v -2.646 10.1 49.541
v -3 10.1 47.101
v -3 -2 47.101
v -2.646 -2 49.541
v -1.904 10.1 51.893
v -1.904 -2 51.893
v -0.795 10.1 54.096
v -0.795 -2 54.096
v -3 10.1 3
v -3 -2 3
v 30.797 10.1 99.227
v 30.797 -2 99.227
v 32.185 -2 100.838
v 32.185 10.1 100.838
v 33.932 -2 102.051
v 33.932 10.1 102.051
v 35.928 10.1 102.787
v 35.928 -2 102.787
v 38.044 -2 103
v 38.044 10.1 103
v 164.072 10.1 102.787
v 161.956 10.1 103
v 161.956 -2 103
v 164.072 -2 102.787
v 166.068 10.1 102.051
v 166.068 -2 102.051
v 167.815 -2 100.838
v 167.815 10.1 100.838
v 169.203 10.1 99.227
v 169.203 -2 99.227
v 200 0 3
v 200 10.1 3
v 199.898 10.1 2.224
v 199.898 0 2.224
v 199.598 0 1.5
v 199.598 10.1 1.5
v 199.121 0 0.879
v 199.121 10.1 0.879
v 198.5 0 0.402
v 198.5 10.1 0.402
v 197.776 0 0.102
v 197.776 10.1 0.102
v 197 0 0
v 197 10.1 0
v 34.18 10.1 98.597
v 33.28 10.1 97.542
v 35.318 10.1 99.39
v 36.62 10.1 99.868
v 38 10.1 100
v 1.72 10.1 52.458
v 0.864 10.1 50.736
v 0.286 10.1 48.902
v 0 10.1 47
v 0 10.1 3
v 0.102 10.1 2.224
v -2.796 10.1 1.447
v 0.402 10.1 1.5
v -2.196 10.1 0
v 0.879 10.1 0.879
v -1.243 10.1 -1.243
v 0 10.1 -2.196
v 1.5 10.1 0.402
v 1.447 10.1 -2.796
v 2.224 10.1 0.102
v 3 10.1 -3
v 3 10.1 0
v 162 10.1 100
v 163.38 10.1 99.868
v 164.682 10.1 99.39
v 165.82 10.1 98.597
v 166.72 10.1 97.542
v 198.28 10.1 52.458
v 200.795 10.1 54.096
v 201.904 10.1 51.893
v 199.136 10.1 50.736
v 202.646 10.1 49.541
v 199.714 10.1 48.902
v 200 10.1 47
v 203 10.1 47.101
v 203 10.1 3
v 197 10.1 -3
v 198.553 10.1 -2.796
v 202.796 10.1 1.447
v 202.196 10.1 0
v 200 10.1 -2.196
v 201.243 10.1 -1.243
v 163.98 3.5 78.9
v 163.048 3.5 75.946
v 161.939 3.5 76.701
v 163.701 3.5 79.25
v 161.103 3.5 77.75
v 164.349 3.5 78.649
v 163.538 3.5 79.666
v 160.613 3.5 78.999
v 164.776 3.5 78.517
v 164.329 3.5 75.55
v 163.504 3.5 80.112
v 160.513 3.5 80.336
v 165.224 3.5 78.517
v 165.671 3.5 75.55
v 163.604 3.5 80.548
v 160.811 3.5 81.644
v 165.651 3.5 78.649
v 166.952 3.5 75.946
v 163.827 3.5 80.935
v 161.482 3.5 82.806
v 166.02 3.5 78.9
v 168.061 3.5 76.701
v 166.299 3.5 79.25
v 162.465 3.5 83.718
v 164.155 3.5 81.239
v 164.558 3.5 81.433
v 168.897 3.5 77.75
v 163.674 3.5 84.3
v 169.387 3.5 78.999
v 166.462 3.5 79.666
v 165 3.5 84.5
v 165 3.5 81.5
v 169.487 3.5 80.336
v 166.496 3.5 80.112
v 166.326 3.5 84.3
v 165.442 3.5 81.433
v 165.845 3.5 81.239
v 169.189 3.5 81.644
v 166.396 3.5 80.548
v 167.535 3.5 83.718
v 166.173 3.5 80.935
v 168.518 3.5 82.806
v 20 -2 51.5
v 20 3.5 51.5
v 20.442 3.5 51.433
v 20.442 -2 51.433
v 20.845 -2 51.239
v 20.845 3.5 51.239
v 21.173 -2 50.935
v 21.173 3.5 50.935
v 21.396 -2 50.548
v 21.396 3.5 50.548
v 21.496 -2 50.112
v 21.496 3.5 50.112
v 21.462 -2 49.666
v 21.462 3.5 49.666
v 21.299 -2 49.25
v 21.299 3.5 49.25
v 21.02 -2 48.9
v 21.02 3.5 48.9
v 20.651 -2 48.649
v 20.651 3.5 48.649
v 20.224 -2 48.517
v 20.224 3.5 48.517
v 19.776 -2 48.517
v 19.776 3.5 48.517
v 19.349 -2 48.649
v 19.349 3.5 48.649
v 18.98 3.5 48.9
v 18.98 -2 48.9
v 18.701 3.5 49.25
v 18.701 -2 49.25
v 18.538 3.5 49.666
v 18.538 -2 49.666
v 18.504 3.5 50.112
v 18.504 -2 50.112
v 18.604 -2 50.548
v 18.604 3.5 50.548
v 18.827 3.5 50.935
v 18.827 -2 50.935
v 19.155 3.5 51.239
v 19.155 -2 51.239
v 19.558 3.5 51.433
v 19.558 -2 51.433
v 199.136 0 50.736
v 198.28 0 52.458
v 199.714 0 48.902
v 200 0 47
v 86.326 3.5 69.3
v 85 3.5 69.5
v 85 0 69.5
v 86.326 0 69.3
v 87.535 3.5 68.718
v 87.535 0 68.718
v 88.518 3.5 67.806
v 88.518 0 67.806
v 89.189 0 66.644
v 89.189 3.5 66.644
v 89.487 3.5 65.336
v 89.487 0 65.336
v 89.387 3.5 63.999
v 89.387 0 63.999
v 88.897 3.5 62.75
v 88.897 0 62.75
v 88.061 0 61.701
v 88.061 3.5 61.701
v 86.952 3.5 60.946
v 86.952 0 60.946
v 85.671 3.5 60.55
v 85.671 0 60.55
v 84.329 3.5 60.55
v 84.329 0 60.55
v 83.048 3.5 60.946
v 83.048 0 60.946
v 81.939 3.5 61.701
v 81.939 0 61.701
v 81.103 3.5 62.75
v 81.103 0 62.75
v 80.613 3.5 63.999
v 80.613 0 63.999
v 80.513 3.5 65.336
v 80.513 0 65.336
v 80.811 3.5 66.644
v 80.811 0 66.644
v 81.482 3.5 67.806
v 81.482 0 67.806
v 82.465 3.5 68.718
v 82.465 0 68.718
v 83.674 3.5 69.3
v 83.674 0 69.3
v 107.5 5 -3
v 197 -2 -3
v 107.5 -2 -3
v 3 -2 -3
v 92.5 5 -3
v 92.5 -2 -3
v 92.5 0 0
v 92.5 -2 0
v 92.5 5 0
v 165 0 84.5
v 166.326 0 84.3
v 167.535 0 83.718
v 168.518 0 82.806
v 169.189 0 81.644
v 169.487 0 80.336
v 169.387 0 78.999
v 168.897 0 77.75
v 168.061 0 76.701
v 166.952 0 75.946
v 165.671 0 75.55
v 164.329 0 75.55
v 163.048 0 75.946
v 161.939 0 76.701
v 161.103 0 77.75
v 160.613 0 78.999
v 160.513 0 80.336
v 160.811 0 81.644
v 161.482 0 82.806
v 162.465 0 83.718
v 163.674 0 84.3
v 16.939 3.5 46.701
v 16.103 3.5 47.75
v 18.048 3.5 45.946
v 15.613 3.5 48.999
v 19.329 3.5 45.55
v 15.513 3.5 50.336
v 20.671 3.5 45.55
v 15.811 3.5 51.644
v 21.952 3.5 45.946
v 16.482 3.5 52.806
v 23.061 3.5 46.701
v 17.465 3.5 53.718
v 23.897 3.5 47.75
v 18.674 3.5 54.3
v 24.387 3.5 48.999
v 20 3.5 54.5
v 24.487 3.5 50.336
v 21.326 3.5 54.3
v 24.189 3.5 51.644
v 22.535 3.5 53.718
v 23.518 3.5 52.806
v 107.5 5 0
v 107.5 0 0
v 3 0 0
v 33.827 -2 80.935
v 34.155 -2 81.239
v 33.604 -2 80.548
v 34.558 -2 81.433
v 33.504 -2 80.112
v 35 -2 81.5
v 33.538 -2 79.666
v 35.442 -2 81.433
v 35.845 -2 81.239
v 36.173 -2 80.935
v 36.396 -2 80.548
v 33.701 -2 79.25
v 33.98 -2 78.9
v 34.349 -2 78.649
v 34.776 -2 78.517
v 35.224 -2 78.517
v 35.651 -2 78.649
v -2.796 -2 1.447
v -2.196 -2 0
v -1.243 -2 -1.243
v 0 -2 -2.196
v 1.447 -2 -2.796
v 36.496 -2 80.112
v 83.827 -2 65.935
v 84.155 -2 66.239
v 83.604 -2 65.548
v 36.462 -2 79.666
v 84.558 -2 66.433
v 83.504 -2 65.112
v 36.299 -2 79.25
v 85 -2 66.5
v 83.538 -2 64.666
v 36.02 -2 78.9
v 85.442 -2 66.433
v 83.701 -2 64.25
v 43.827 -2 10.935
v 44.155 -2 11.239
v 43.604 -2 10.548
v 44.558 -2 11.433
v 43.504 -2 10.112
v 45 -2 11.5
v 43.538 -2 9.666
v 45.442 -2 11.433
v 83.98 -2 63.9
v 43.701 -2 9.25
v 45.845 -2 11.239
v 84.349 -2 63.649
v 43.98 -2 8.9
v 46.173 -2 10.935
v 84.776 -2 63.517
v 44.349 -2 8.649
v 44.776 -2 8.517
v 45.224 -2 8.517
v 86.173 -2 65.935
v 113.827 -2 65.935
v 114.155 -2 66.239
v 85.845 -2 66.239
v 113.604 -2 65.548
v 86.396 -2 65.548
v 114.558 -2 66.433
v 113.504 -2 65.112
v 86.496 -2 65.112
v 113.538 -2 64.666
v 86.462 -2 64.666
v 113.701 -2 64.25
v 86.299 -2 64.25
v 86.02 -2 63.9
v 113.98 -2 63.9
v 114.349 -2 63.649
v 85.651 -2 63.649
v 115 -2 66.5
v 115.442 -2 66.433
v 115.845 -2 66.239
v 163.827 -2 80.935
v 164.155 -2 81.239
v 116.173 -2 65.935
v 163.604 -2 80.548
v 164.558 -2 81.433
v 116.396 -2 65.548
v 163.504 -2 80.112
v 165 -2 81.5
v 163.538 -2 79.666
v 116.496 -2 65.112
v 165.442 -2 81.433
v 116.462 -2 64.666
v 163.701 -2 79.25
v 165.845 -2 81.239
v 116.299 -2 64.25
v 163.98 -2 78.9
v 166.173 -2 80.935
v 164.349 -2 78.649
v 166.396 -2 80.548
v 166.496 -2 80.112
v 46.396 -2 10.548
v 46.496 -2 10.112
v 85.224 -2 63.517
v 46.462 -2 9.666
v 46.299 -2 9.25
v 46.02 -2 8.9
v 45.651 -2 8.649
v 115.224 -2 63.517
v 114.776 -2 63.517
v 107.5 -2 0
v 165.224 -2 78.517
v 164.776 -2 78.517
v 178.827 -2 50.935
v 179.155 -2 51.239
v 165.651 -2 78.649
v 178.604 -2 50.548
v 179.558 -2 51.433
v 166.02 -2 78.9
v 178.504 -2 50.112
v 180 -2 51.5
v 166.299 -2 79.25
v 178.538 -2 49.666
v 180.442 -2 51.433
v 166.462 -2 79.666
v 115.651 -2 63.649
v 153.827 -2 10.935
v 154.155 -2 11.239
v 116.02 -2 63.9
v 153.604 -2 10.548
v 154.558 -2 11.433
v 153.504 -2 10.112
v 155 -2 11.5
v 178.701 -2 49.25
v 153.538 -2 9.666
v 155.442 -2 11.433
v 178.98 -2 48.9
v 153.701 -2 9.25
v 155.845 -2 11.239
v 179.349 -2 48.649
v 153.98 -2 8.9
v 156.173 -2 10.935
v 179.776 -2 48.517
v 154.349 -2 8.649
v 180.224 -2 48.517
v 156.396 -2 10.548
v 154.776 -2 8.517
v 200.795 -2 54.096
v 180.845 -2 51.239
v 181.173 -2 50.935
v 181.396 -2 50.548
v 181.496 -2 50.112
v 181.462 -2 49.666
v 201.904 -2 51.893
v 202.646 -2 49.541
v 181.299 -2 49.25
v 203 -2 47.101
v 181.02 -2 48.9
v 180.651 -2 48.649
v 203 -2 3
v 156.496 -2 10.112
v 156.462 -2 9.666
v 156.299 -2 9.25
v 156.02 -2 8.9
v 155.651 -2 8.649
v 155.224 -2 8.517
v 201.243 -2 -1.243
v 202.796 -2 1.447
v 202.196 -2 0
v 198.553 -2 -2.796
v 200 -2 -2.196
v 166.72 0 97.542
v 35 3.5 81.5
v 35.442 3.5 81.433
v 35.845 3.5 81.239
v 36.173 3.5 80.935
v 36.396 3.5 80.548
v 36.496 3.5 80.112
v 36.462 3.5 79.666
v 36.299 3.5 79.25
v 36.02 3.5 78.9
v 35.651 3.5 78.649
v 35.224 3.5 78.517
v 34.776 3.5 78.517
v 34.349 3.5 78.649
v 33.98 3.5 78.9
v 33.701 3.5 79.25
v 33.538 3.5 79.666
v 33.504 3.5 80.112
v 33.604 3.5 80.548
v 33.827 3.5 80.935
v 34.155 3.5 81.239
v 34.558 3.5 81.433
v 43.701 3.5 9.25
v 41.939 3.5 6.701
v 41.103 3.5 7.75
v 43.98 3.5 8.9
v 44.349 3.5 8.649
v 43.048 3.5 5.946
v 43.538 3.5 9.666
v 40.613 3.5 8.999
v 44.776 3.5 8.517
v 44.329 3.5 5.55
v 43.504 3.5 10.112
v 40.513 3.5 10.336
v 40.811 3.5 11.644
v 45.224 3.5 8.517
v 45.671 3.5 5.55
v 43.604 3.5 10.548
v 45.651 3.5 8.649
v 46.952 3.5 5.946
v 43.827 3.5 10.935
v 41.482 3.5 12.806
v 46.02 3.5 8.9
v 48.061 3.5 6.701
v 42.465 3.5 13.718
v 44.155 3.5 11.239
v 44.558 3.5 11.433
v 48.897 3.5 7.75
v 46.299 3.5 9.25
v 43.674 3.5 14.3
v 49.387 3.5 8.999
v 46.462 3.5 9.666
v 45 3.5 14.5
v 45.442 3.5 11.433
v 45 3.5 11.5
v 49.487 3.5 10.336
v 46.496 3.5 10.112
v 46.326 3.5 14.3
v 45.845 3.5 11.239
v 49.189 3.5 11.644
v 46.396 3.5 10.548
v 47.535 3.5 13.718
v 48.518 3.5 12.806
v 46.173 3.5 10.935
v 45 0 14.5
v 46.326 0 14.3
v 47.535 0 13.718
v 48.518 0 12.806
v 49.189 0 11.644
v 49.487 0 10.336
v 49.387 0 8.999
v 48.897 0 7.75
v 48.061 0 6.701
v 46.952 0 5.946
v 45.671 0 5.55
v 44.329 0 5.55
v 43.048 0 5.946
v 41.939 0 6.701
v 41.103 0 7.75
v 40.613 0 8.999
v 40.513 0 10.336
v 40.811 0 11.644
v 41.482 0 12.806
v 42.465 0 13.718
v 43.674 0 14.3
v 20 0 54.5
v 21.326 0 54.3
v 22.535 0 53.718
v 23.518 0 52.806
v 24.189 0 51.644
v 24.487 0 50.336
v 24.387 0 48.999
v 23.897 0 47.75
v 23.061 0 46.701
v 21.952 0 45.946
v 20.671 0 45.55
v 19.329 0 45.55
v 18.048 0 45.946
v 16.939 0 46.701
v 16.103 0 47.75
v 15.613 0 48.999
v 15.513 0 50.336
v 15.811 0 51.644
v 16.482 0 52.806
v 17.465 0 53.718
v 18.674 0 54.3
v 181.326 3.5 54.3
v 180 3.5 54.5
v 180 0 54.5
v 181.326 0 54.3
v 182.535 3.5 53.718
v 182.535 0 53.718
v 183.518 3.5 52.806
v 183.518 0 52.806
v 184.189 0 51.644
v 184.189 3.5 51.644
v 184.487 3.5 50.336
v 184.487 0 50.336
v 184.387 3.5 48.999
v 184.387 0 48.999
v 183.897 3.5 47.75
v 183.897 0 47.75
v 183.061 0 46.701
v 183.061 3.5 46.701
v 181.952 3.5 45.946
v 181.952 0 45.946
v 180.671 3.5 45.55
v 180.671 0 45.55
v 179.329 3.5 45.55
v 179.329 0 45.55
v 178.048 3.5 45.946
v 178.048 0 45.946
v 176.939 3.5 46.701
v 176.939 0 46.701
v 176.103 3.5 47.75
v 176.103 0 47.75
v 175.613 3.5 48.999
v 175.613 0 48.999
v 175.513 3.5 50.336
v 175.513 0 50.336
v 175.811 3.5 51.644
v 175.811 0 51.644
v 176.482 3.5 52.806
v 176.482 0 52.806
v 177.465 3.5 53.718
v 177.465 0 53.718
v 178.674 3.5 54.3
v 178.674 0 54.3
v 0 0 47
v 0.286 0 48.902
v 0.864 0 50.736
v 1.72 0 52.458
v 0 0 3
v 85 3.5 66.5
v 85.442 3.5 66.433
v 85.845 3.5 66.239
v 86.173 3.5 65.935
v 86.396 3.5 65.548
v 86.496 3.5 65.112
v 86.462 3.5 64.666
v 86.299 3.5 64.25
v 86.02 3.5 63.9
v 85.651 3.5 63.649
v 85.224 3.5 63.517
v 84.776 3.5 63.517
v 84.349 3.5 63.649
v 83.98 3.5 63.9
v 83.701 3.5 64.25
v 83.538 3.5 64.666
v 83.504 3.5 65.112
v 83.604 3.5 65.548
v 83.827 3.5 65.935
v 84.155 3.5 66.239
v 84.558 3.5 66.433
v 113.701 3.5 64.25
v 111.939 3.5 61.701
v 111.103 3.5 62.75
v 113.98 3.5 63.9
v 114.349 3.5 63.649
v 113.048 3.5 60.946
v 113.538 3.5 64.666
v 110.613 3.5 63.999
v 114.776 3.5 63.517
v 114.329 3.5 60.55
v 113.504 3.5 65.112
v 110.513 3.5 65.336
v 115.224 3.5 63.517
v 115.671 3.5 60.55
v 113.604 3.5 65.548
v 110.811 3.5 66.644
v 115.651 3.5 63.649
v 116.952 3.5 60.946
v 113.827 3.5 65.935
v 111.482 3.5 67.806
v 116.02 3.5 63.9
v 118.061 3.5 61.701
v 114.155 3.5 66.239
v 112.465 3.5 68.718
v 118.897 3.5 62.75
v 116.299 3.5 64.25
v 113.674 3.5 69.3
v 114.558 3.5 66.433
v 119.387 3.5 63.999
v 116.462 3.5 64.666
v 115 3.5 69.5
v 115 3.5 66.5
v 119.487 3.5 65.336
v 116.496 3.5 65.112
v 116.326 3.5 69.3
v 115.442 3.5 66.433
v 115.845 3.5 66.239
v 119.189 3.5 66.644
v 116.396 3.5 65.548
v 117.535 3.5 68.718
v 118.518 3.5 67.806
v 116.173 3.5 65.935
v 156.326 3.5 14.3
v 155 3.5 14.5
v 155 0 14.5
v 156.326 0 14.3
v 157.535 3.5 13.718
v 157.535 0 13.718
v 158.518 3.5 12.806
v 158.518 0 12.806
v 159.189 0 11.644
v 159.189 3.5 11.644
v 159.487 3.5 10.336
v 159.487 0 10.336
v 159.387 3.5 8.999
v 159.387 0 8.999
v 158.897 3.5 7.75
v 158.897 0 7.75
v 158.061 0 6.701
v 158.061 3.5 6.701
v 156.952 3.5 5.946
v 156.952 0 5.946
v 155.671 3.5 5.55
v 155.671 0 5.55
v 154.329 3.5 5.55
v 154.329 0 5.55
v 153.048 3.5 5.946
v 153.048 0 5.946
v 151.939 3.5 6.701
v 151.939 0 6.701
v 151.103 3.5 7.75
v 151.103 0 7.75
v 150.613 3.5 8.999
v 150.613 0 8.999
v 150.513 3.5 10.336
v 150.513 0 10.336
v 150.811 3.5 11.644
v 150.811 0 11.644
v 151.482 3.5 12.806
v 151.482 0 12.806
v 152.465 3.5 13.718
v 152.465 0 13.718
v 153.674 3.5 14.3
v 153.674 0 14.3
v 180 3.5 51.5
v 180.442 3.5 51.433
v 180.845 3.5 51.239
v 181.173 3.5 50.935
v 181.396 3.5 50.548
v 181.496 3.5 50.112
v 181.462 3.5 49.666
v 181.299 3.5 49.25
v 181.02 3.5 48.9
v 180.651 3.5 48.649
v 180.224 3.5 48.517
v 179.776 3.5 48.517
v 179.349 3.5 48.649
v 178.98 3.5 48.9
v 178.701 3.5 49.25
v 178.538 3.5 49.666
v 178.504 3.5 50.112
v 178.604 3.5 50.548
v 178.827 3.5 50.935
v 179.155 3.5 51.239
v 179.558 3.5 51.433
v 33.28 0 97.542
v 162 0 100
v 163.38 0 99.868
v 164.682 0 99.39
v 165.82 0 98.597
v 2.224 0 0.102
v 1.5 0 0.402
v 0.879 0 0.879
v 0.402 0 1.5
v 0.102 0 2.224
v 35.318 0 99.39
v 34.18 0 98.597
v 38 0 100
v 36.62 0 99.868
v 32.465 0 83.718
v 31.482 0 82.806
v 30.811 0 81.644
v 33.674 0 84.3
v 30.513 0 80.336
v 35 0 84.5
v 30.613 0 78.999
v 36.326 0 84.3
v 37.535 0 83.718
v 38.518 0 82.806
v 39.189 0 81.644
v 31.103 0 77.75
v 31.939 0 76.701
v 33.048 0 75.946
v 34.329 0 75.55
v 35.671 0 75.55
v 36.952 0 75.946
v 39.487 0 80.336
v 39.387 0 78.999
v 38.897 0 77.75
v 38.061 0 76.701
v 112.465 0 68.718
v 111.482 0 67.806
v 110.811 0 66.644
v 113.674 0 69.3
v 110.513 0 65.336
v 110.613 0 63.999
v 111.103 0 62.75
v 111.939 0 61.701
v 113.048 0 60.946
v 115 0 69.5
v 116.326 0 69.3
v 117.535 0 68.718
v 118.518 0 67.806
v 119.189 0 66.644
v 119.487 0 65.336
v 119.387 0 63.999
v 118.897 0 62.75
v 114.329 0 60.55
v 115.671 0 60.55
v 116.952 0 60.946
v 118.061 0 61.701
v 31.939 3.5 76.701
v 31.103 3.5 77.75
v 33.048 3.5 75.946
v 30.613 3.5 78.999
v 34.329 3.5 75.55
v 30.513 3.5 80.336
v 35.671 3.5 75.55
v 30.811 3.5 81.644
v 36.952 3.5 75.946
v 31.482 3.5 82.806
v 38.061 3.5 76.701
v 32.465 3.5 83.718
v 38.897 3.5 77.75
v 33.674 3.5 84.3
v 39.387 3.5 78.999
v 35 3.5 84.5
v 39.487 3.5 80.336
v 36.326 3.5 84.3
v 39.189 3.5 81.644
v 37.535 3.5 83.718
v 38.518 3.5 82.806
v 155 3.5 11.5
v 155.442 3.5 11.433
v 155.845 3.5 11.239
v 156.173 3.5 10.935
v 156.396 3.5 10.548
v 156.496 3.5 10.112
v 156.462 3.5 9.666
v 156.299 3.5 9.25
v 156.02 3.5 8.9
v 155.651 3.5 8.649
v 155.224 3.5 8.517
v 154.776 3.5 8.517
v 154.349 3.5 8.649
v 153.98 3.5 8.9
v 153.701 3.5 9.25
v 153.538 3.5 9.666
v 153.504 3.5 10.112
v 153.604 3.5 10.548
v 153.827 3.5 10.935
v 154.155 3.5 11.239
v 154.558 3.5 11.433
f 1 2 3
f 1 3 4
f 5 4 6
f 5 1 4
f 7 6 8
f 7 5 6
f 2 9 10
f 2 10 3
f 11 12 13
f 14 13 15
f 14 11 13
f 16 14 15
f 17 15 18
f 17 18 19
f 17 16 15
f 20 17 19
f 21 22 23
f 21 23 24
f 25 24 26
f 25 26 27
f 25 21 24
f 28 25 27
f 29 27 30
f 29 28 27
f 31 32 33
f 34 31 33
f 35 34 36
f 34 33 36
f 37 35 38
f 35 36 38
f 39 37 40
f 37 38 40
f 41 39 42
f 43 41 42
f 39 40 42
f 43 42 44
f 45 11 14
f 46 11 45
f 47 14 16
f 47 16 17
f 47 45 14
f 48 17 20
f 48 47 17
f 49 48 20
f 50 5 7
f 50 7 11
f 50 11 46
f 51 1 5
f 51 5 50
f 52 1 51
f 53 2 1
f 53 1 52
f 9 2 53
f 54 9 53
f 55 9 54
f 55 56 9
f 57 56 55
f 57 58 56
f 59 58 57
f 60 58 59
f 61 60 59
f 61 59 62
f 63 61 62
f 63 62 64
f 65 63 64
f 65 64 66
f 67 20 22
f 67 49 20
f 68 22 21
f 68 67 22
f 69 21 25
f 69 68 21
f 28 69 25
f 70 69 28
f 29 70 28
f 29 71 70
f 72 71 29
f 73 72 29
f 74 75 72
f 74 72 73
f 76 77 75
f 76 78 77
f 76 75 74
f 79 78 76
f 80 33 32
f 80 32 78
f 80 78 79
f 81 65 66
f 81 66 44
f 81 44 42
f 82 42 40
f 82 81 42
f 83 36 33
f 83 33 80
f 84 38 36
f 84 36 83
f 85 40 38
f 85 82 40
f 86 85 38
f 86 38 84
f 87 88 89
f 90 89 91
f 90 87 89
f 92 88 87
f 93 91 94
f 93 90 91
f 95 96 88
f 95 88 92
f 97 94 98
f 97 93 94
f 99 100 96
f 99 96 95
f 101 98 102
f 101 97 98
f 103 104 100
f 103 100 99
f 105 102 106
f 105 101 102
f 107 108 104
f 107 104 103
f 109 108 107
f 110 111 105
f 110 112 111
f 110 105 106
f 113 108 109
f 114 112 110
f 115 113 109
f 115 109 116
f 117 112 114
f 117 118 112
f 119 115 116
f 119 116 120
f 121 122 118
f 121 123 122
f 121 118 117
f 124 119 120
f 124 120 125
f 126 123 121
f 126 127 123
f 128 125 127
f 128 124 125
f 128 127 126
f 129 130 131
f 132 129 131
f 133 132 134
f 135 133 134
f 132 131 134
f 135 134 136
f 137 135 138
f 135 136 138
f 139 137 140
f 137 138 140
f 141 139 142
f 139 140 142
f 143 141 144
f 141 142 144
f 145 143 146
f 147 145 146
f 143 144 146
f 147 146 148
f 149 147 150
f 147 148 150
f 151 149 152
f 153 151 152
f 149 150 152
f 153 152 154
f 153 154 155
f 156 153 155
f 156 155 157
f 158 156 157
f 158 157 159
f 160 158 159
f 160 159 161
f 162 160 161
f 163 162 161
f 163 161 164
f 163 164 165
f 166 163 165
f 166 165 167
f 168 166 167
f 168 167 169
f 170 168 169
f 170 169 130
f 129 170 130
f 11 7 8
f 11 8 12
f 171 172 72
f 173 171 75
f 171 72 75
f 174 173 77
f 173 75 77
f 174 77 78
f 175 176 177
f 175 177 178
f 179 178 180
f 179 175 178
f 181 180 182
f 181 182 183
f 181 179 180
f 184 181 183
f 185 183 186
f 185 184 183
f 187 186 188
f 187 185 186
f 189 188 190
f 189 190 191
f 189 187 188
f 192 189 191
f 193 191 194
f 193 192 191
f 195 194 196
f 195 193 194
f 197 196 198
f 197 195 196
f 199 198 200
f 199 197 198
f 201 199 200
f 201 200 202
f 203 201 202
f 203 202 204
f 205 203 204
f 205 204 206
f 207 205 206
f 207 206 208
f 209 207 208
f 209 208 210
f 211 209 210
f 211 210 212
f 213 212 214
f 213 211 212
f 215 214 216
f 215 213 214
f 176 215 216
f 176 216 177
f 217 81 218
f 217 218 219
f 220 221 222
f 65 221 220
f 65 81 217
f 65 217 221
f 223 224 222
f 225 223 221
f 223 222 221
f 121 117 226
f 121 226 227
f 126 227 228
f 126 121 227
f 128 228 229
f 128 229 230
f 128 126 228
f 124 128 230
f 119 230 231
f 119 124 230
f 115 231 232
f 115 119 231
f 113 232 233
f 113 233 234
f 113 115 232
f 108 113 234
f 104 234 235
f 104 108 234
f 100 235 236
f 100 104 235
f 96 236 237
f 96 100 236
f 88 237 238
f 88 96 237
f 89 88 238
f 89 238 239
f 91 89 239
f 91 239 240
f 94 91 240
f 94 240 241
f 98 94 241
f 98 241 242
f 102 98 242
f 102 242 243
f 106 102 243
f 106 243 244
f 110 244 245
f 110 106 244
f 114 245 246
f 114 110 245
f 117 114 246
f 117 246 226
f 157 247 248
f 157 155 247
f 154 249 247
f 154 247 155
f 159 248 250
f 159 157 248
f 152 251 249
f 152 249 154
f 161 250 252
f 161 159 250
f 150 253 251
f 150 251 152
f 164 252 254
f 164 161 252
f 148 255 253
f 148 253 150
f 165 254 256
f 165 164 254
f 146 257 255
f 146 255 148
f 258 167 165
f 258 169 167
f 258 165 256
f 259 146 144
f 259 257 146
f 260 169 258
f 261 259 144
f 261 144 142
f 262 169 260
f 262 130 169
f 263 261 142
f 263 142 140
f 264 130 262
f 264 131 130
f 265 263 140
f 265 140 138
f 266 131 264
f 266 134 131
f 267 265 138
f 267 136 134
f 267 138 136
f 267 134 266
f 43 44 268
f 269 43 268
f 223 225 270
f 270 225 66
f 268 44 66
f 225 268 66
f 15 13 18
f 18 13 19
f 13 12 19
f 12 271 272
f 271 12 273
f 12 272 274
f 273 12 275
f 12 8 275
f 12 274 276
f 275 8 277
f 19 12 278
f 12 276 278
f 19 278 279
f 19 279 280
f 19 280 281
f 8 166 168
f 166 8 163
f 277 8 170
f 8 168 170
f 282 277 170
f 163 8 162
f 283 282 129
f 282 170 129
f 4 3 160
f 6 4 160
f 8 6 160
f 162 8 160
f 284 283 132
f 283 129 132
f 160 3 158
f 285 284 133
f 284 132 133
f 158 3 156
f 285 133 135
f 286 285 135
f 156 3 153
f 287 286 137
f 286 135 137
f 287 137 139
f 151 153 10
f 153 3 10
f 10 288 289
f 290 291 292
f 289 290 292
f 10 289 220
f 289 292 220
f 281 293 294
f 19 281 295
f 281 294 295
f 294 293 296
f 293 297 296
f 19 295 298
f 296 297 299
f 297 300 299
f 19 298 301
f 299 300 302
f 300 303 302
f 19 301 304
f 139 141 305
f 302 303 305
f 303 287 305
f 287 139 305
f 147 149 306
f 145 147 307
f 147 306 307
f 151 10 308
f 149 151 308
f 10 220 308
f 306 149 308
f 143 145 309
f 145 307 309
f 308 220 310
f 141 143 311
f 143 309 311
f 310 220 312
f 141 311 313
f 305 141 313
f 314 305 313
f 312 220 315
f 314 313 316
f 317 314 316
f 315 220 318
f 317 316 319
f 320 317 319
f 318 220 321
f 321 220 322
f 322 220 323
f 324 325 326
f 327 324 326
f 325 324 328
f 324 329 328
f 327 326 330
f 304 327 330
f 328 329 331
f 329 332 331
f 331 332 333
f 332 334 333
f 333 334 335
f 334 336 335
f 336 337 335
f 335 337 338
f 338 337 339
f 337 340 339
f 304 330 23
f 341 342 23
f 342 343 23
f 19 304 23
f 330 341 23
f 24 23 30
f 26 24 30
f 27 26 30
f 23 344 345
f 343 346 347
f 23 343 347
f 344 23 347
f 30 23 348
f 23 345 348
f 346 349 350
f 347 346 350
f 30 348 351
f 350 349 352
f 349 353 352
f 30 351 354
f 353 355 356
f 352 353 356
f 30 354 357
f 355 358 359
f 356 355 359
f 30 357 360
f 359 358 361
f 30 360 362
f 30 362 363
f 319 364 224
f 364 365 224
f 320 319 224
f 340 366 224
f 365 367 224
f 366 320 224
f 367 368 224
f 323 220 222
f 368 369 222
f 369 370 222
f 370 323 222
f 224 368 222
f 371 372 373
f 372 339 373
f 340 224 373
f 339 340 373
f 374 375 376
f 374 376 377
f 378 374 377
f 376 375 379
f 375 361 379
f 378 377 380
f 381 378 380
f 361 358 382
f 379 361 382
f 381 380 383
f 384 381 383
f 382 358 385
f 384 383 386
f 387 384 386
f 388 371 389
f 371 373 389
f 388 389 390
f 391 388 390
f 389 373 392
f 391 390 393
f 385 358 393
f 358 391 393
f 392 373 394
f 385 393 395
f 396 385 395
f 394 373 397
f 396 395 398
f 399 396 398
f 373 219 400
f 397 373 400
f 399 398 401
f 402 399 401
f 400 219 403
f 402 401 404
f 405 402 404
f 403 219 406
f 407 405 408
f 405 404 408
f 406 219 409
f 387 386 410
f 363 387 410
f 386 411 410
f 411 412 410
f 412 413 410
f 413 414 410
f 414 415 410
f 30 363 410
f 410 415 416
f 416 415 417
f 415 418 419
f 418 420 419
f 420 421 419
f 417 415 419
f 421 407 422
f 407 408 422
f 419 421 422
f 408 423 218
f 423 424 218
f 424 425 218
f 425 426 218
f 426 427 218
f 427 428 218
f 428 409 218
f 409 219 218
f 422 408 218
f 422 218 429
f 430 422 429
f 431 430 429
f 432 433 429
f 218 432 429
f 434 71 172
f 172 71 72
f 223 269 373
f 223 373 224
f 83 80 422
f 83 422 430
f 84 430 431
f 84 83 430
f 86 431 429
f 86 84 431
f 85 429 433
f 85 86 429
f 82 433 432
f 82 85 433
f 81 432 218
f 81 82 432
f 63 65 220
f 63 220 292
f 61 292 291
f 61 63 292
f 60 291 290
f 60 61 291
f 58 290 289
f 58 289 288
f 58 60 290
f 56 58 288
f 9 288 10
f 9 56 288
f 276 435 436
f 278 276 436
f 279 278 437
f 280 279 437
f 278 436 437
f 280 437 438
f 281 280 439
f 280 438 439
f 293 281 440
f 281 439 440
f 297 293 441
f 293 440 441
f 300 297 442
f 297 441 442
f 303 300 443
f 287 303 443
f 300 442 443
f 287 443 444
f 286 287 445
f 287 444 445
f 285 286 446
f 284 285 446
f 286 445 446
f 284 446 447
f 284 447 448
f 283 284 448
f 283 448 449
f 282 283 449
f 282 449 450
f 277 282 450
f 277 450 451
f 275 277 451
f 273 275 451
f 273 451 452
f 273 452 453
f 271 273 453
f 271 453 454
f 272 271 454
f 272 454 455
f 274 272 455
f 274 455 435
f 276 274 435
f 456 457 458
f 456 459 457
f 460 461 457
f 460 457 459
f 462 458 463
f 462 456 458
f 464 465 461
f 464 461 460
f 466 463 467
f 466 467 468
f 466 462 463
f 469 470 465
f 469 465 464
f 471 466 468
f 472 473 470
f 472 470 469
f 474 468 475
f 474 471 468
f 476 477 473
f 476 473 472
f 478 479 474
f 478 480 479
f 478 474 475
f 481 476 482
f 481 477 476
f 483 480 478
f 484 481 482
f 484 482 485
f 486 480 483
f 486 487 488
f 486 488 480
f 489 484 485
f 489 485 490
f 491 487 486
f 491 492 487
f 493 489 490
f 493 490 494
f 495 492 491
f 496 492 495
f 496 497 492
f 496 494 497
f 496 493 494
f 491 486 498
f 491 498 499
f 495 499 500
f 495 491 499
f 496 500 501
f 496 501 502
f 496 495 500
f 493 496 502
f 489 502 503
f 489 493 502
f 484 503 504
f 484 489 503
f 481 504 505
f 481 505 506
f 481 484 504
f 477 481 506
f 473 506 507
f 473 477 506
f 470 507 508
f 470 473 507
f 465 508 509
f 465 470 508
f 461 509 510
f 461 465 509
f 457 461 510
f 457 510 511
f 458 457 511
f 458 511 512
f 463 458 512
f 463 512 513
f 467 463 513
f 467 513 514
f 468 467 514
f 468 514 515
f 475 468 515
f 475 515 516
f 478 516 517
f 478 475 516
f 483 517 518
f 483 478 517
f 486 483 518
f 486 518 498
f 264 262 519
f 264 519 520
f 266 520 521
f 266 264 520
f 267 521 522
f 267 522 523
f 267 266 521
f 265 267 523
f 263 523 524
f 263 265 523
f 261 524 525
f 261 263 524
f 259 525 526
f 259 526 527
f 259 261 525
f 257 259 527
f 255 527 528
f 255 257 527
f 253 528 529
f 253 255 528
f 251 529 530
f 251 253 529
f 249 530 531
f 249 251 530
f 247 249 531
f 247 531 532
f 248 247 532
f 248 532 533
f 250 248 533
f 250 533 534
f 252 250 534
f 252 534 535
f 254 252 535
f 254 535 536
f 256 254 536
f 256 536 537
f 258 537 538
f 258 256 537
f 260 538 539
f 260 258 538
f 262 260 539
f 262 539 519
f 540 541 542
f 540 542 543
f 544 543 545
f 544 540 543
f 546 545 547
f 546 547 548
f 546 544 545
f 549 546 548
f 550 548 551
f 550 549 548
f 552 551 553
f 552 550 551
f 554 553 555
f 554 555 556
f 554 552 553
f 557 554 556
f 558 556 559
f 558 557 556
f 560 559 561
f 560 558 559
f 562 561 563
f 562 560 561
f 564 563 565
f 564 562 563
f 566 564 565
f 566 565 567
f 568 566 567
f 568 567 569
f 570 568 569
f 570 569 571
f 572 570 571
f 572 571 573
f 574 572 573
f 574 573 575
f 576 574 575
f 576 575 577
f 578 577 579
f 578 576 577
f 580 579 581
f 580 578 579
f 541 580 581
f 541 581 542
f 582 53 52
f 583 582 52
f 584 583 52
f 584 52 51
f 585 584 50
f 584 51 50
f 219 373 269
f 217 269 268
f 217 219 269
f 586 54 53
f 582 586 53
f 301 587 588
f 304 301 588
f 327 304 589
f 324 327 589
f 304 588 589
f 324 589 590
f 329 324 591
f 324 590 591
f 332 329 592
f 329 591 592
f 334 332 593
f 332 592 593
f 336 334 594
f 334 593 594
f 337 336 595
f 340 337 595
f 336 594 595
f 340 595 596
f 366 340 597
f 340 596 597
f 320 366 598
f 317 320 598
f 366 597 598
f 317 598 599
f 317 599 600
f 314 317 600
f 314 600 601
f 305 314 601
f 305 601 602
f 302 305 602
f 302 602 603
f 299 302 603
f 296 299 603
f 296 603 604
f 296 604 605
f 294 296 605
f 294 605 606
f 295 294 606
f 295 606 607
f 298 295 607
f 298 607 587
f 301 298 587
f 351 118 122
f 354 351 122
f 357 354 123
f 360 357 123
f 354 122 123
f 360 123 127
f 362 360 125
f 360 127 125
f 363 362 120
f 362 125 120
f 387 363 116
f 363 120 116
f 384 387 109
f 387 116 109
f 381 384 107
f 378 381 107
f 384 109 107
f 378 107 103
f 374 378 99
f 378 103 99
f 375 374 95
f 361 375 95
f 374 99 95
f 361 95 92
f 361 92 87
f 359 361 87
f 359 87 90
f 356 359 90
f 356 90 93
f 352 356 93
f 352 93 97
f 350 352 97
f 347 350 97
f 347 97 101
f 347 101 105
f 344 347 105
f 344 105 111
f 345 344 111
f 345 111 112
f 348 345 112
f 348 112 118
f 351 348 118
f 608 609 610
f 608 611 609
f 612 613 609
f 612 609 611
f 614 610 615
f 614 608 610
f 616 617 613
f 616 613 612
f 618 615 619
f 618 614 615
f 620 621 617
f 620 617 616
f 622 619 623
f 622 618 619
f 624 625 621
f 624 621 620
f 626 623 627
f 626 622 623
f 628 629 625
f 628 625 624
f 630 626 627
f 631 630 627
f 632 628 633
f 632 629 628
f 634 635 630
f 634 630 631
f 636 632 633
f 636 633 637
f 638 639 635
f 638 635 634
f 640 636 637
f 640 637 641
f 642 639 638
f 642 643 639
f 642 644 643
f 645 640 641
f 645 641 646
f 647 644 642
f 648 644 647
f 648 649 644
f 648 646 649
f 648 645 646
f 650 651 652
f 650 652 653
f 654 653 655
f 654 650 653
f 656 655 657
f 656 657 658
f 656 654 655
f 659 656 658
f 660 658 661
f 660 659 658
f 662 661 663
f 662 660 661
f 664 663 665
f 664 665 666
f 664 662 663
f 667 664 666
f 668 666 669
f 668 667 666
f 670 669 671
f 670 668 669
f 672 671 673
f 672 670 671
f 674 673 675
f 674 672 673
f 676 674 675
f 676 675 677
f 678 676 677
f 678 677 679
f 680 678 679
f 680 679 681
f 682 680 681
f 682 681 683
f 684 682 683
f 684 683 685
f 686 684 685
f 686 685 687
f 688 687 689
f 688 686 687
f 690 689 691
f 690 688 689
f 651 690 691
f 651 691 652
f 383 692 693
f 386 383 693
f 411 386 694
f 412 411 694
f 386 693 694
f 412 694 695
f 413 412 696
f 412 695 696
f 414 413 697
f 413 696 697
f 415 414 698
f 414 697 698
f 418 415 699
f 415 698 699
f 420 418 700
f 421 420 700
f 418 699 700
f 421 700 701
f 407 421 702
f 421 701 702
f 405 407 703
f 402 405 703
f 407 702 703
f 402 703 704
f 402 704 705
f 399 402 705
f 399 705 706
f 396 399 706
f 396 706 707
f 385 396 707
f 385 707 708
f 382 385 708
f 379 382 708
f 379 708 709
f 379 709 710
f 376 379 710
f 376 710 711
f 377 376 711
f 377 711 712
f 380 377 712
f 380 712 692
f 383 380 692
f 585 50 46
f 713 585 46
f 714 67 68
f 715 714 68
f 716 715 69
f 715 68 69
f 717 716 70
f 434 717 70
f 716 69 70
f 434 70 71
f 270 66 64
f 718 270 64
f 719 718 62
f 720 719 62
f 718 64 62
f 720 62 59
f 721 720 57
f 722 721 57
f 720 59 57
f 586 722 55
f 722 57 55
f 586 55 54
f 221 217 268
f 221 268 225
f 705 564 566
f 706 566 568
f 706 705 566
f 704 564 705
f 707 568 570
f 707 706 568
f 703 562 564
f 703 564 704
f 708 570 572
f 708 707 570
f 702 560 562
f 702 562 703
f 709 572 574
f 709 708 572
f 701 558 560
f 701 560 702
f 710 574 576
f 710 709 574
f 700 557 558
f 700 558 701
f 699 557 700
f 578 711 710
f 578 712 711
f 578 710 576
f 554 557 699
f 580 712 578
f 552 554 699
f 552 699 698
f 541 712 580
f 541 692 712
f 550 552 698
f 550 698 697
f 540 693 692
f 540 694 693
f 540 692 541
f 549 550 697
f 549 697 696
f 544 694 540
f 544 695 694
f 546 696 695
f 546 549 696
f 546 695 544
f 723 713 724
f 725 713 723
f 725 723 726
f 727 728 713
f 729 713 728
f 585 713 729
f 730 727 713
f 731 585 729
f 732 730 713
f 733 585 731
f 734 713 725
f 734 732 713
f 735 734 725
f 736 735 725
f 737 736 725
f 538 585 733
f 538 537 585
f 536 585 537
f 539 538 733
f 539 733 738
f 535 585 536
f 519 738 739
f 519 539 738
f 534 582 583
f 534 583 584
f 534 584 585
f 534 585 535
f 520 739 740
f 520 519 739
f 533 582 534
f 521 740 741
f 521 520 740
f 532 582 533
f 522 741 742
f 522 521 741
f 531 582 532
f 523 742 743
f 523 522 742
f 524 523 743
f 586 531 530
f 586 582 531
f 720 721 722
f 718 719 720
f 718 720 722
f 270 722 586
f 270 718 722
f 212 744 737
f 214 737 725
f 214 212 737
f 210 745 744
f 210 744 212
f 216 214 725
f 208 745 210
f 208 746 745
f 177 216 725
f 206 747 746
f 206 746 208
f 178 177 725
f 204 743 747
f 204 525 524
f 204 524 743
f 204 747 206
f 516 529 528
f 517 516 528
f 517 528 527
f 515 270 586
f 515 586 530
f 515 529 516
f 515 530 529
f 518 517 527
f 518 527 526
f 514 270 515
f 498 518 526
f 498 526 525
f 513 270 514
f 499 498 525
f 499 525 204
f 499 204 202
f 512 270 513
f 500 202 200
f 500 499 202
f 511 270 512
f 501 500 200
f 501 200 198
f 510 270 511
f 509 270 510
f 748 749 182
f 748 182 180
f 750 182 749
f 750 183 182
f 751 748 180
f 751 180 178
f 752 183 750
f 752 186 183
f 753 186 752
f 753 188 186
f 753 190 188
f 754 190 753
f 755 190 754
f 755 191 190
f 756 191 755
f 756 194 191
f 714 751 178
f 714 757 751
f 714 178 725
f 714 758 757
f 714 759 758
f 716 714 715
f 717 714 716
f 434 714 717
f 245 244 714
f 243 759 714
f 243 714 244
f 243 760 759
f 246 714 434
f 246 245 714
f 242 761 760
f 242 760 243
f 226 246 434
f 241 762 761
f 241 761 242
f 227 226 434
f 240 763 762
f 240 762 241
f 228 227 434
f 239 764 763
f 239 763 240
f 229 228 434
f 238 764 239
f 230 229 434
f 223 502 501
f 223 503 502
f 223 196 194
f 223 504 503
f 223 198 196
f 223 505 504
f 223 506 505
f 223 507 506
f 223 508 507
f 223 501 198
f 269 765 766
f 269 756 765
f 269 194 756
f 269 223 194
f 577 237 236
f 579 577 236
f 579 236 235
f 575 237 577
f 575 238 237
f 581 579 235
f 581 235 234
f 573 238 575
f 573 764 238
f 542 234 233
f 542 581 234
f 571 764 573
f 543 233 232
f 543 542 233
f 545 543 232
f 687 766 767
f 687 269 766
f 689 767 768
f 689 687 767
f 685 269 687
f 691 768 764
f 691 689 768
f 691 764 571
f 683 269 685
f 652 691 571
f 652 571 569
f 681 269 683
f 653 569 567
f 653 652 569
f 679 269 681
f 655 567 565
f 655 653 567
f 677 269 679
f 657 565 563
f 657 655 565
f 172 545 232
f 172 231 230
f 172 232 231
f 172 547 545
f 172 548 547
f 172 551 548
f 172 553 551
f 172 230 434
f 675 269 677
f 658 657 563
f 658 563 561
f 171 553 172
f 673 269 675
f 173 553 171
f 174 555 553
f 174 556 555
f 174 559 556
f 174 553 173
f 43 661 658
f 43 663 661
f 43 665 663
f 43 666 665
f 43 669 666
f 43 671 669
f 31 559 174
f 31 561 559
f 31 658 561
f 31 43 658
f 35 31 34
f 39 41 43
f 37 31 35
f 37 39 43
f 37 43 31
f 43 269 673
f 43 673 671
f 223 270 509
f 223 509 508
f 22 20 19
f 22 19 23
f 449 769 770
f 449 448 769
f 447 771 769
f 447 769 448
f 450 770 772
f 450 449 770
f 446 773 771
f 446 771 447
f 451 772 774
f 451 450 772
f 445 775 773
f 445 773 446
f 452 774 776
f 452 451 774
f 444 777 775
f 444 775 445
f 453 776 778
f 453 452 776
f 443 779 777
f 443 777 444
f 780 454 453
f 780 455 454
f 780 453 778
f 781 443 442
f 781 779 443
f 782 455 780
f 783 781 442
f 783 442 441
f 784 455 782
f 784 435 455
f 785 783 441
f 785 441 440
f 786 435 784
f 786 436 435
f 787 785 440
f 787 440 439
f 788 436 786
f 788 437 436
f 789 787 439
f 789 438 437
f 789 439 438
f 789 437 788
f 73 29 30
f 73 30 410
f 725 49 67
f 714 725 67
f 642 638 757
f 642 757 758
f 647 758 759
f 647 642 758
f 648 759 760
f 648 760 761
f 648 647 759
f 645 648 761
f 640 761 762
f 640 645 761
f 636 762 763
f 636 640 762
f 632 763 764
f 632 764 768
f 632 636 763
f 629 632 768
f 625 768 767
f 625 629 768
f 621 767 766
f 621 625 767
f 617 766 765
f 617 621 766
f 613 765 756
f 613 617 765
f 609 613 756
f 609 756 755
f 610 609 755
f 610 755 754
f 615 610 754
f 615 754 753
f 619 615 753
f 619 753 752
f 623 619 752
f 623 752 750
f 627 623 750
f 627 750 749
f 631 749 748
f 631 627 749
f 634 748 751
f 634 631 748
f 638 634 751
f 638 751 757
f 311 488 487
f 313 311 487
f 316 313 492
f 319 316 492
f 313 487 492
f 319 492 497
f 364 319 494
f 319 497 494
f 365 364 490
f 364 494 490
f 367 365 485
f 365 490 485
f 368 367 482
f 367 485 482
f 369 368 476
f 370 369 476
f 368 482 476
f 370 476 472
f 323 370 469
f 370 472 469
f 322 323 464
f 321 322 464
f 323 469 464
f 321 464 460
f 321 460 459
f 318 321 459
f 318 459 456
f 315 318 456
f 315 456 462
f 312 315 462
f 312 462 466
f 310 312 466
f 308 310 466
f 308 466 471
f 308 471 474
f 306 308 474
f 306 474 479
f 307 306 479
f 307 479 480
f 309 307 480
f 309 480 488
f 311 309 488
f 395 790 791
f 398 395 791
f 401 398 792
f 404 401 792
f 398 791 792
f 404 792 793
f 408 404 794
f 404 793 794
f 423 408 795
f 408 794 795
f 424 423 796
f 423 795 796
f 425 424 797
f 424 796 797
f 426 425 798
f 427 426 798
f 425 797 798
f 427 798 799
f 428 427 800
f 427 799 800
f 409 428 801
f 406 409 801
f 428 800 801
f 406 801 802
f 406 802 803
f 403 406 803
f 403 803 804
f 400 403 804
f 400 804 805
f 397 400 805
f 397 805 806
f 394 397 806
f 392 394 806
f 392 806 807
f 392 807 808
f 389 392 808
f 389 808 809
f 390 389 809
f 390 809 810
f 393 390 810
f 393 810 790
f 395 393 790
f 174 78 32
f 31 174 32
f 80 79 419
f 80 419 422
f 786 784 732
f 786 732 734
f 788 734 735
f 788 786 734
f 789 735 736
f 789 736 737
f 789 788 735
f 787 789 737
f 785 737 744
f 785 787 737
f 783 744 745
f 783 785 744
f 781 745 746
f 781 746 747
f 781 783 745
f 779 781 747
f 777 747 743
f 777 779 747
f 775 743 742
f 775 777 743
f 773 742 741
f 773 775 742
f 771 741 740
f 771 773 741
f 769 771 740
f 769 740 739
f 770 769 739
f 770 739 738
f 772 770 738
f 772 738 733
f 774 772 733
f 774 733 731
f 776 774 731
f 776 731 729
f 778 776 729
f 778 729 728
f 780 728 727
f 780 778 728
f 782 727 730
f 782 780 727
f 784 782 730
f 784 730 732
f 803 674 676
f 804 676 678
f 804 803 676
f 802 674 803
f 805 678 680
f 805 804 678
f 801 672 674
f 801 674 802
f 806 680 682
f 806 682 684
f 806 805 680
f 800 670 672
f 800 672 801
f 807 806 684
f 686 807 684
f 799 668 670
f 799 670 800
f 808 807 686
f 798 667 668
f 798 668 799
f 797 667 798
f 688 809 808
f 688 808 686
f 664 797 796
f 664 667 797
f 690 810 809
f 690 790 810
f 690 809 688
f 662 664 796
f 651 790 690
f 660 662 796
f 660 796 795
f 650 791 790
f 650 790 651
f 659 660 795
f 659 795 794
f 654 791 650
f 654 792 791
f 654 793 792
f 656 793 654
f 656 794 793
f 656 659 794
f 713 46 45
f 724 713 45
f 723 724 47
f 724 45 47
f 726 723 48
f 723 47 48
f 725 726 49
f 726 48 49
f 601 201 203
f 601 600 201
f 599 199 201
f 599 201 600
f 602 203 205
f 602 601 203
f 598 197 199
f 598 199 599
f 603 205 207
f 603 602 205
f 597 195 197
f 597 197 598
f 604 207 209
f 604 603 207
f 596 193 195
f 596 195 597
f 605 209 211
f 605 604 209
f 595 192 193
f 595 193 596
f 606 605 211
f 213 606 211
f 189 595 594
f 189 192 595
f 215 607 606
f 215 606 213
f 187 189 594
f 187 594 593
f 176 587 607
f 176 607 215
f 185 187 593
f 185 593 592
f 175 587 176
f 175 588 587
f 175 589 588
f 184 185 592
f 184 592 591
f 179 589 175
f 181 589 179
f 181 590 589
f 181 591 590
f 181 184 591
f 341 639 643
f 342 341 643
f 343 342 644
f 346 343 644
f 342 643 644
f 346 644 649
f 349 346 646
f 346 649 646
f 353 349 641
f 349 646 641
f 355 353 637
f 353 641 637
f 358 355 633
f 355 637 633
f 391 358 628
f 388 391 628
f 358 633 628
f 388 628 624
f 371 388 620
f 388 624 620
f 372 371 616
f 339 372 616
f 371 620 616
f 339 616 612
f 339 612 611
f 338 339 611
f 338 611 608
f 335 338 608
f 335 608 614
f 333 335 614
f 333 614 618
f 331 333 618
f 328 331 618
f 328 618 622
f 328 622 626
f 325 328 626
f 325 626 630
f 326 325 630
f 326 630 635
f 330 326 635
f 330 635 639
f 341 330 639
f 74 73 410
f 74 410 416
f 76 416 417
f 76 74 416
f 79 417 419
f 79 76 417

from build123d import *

# Parameters (mm, degrees)
EXTRUDE_1_DEPTH     = 2
EXTRUDE_START       = 10.1
EXTRUDE_2_DEPTH     = 10.1
SKETCH_3_R          = 1.5
CUT_EXTRUDE_1_DEPTH = 228.860936532
EXTRUDE_START_2     = 3.5
SKETCH_6_R          = 4.5
SKETCH_6_R_2        = 1.5
EXTRUDE_3_DEPTH     = 3.5
SKETCH_7_W          = 15
SKETCH_7_H          = 7
CUT_EXTRUDE_2_DEPTH = 3


with BuildPart() as part:
    # 草图1 → 凸台-拉伸1 (new body)
    with BuildSketch(Plane(origin=(0, 0, 0), x_dir=(1, 0, 0), z_dir=(0, 1, 0))):
        with BuildLine():
            Line((197, 3), (3, 3))
            ThreePointArc((3, 3), (-1.242640687, 1.242640687), (-3, -3))
            Line((-3, -3), (-3, -47.100513143))
            ThreePointArc((-3, -47.100513143), (-2.32247943, -50.732097147), (-0.794949231, -54.09573922))
            Line((-0.794949231, -54.09573922), (30.796891429, -99.226940163))
            ThreePointArc((30.796891429, -99.226940163), (33.932268231, -102.05074496), (38.04363979, -103))
            Line((38.04363979, -103), (161.95636021, -103))
            ThreePointArc((161.95636021, -103), (166.067731769, -102.05074496), (169.203108571, -99.226940163))
            Line((169.203108571, -99.226940163), (200.794949231, -54.09573922))
            ThreePointArc((200.794949231, -54.09573922), (202.32247943, -50.732097147), (203, -47.100513143))
            Line((203, -47.100513143), (203, -3))
            ThreePointArc((203, -3), (201.242640687, 1.242640687), (197, 3))
        make_face()
    extrude(amount=-EXTRUDE_1_DEPTH)

    # 草图1<3> → 凸台-拉伸2 (add)
    with BuildSketch(Plane(origin=(0, 0, 0), x_dir=(1, 0, 0), z_dir=(0, 1, 0)).offset(EXTRUDE_START)):
        with BuildLine():
            Line((197, 3), (3, 3))
            ThreePointArc((3, 3), (-1.242640687, 1.242640687), (-3, -3))
            Line((-3, -3), (-3, -47.100513143))
            ThreePointArc((-3, -47.100513143), (-2.32247943, -50.732097147), (-0.794949231, -54.09573922))
            Line((-0.794949231, -54.09573922), (30.796891429, -99.226940163))
            ThreePointArc((30.796891429, -99.226940163), (33.932268231, -102.05074496), (38.04363979, -103))
            Line((38.04363979, -103), (161.95636021, -103))
            ThreePointArc((161.95636021, -103), (166.067731769, -102.05074496), (169.203108571, -99.226940163))
            Line((169.203108571, -99.226940163), (200.794949231, -54.09573922))
            ThreePointArc((200.794949231, -54.09573922), (202.32247943, -50.732097147), (203, -47.100513143))
            Line((203, -47.100513143), (203, -3))
            ThreePointArc((203, -3), (201.242640687, 1.242640687), (197, 3))
        make_face()
        with BuildLine():
            Line((0, -3), (0, -47))
            ThreePointArc((0, -47), (0.538734236, -49.830178992), (1.720387033, -52.457695762))
            Line((1.720387033, -52.457695762), (33.279612967, -97.542304238))
            ThreePointArc((33.279612967, -97.542304238), (35.317699373, -99.389808931), (38, -100))
            Line((38, -100), (162, -100))
            ThreePointArc((162, -100), (164.682300627, -99.389808931), (166.720387033, -97.542304238))
            Line((166.720387033, -97.542304238), (198.279612967, -52.457695762))
            ThreePointArc((198.279612967, -52.457695762), (199.461265764, -49.830178992), (200, -47))
            Line((200, -47), (200, -3))
            ThreePointArc((200, -3), (199.121320344, -0.878679656), (197, 0))
            Line((197, 0), (3, 0))
            ThreePointArc((3, 0), (0.878679656, -0.878679656), (0, -3))
        make_face(mode=Mode.SUBTRACT)
    extrude(amount=-EXTRUDE_2_DEPTH)

    # 草图3 → 切除-拉伸1 (cut, through all)
    with BuildSketch(Plane(origin=(0, 0, 0), x_dir=(1, 0, 0), z_dir=(0, 1, 0))):
        with Locations((45, -10)):
            Circle(SKETCH_3_R)
        with Locations((20, -50)):
            Circle(SKETCH_3_R)
        with Locations((35, -80)):
            Circle(SKETCH_3_R)
        with Locations((85, -65)):
            Circle(SKETCH_3_R)
        with Locations((155, -10)):
            Circle(SKETCH_3_R)
        with Locations((180, -50)):
            Circle(SKETCH_3_R)
        with Locations((165, -80)):
            Circle(SKETCH_3_R)
        with Locations((115, -65)):
            Circle(SKETCH_3_R)
    extrude(amount=-CUT_EXTRUDE_1_DEPTH, mode=Mode.SUBTRACT)

    # 草图6 → 凸台-拉伸3 (add)
    # profile 1 of 8: a face of its own
    with BuildSketch(Plane(origin=(0, 0, 0), x_dir=(1, 0, 0), z_dir=(0, 1, 0)).offset(EXTRUDE_START_2)):
        with Locations((85, -65)):
            Circle(SKETCH_6_R)
        with Locations((85, -65)):
            Circle(SKETCH_6_R_2, mode=Mode.SUBTRACT)
    # profile 2 of 8: a face of its own
    with BuildSketch(Plane(origin=(0, 0, 0), x_dir=(1, 0, 0), z_dir=(0, 1, 0)).offset(EXTRUDE_START_2)):
        with Locations((35, -80)):
            Circle(SKETCH_6_R)
        with Locations((35, -80)):
            Circle(SKETCH_6_R_2, mode=Mode.SUBTRACT)
    # profile 3 of 8: a face of its own
    with BuildSketch(Plane(origin=(0, 0, 0), x_dir=(1, 0, 0), z_dir=(0, 1, 0)).offset(EXTRUDE_START_2)):
        with Locations((20, -50)):
            Circle(SKETCH_6_R)
        with Locations((20, -50)):
            Circle(SKETCH_6_R_2, mode=Mode.SUBTRACT)
    # profile 4 of 8: a face of its own
    with BuildSketch(Plane(origin=(0, 0, 0), x_dir=(1, 0, 0), z_dir=(0, 1, 0)).offset(EXTRUDE_START_2)):
        with Locations((45, -10)):
            Circle(SKETCH_6_R)
        with Locations((45, -10)):
            Circle(SKETCH_6_R_2, mode=Mode.SUBTRACT)
    # profile 5 of 8: a face of its own
    with BuildSketch(Plane(origin=(0, 0, 0), x_dir=(1, 0, 0), z_dir=(0, 1, 0)).offset(EXTRUDE_START_2)):
        with Locations((155, -10)):
            Circle(SKETCH_6_R)
        with Locations((155, -10)):
            Circle(SKETCH_6_R_2, mode=Mode.SUBTRACT)
    # profile 6 of 8: a face of its own
    with BuildSketch(Plane(origin=(0, 0, 0), x_dir=(1, 0, 0), z_dir=(0, 1, 0)).offset(EXTRUDE_START_2)):
        with Locations((115, -65)):
            Circle(SKETCH_6_R)
        with Locations((115, -65)):
            Circle(SKETCH_6_R_2, mode=Mode.SUBTRACT)
    # profile 7 of 8: a face of its own
    with BuildSketch(Plane(origin=(0, 0, 0), x_dir=(1, 0, 0), z_dir=(0, 1, 0)).offset(EXTRUDE_START_2)):
        with Locations((180, -50)):
            Circle(SKETCH_6_R)
        with Locations((180, -50)):
            Circle(SKETCH_6_R_2, mode=Mode.SUBTRACT)
    # profile 8 of 8: a face of its own
    with BuildSketch(Plane(origin=(0, 0, 0), x_dir=(1, 0, 0), z_dir=(0, 1, 0)).offset(EXTRUDE_START_2)):
        with Locations((165, -80)):
            Circle(SKETCH_6_R)
        with Locations((165, -80)):
            Circle(SKETCH_6_R_2, mode=Mode.SUBTRACT)
    extrude(amount=-EXTRUDE_3_DEPTH)

    # 草图7 → 切除-拉伸2 (cut)
    with BuildSketch(Plane(origin=(0, 0, -3), x_dir=(-1, 0, 0), z_dir=(0, 0, -1))):
        with Locations((-100, 1.5)):
            Rectangle(SKETCH_7_W, SKETCH_7_H)
    extrude(amount=-CUT_EXTRUDE_2_DEPTH, mode=Mode.SUBTRACT)


solid = part.part
